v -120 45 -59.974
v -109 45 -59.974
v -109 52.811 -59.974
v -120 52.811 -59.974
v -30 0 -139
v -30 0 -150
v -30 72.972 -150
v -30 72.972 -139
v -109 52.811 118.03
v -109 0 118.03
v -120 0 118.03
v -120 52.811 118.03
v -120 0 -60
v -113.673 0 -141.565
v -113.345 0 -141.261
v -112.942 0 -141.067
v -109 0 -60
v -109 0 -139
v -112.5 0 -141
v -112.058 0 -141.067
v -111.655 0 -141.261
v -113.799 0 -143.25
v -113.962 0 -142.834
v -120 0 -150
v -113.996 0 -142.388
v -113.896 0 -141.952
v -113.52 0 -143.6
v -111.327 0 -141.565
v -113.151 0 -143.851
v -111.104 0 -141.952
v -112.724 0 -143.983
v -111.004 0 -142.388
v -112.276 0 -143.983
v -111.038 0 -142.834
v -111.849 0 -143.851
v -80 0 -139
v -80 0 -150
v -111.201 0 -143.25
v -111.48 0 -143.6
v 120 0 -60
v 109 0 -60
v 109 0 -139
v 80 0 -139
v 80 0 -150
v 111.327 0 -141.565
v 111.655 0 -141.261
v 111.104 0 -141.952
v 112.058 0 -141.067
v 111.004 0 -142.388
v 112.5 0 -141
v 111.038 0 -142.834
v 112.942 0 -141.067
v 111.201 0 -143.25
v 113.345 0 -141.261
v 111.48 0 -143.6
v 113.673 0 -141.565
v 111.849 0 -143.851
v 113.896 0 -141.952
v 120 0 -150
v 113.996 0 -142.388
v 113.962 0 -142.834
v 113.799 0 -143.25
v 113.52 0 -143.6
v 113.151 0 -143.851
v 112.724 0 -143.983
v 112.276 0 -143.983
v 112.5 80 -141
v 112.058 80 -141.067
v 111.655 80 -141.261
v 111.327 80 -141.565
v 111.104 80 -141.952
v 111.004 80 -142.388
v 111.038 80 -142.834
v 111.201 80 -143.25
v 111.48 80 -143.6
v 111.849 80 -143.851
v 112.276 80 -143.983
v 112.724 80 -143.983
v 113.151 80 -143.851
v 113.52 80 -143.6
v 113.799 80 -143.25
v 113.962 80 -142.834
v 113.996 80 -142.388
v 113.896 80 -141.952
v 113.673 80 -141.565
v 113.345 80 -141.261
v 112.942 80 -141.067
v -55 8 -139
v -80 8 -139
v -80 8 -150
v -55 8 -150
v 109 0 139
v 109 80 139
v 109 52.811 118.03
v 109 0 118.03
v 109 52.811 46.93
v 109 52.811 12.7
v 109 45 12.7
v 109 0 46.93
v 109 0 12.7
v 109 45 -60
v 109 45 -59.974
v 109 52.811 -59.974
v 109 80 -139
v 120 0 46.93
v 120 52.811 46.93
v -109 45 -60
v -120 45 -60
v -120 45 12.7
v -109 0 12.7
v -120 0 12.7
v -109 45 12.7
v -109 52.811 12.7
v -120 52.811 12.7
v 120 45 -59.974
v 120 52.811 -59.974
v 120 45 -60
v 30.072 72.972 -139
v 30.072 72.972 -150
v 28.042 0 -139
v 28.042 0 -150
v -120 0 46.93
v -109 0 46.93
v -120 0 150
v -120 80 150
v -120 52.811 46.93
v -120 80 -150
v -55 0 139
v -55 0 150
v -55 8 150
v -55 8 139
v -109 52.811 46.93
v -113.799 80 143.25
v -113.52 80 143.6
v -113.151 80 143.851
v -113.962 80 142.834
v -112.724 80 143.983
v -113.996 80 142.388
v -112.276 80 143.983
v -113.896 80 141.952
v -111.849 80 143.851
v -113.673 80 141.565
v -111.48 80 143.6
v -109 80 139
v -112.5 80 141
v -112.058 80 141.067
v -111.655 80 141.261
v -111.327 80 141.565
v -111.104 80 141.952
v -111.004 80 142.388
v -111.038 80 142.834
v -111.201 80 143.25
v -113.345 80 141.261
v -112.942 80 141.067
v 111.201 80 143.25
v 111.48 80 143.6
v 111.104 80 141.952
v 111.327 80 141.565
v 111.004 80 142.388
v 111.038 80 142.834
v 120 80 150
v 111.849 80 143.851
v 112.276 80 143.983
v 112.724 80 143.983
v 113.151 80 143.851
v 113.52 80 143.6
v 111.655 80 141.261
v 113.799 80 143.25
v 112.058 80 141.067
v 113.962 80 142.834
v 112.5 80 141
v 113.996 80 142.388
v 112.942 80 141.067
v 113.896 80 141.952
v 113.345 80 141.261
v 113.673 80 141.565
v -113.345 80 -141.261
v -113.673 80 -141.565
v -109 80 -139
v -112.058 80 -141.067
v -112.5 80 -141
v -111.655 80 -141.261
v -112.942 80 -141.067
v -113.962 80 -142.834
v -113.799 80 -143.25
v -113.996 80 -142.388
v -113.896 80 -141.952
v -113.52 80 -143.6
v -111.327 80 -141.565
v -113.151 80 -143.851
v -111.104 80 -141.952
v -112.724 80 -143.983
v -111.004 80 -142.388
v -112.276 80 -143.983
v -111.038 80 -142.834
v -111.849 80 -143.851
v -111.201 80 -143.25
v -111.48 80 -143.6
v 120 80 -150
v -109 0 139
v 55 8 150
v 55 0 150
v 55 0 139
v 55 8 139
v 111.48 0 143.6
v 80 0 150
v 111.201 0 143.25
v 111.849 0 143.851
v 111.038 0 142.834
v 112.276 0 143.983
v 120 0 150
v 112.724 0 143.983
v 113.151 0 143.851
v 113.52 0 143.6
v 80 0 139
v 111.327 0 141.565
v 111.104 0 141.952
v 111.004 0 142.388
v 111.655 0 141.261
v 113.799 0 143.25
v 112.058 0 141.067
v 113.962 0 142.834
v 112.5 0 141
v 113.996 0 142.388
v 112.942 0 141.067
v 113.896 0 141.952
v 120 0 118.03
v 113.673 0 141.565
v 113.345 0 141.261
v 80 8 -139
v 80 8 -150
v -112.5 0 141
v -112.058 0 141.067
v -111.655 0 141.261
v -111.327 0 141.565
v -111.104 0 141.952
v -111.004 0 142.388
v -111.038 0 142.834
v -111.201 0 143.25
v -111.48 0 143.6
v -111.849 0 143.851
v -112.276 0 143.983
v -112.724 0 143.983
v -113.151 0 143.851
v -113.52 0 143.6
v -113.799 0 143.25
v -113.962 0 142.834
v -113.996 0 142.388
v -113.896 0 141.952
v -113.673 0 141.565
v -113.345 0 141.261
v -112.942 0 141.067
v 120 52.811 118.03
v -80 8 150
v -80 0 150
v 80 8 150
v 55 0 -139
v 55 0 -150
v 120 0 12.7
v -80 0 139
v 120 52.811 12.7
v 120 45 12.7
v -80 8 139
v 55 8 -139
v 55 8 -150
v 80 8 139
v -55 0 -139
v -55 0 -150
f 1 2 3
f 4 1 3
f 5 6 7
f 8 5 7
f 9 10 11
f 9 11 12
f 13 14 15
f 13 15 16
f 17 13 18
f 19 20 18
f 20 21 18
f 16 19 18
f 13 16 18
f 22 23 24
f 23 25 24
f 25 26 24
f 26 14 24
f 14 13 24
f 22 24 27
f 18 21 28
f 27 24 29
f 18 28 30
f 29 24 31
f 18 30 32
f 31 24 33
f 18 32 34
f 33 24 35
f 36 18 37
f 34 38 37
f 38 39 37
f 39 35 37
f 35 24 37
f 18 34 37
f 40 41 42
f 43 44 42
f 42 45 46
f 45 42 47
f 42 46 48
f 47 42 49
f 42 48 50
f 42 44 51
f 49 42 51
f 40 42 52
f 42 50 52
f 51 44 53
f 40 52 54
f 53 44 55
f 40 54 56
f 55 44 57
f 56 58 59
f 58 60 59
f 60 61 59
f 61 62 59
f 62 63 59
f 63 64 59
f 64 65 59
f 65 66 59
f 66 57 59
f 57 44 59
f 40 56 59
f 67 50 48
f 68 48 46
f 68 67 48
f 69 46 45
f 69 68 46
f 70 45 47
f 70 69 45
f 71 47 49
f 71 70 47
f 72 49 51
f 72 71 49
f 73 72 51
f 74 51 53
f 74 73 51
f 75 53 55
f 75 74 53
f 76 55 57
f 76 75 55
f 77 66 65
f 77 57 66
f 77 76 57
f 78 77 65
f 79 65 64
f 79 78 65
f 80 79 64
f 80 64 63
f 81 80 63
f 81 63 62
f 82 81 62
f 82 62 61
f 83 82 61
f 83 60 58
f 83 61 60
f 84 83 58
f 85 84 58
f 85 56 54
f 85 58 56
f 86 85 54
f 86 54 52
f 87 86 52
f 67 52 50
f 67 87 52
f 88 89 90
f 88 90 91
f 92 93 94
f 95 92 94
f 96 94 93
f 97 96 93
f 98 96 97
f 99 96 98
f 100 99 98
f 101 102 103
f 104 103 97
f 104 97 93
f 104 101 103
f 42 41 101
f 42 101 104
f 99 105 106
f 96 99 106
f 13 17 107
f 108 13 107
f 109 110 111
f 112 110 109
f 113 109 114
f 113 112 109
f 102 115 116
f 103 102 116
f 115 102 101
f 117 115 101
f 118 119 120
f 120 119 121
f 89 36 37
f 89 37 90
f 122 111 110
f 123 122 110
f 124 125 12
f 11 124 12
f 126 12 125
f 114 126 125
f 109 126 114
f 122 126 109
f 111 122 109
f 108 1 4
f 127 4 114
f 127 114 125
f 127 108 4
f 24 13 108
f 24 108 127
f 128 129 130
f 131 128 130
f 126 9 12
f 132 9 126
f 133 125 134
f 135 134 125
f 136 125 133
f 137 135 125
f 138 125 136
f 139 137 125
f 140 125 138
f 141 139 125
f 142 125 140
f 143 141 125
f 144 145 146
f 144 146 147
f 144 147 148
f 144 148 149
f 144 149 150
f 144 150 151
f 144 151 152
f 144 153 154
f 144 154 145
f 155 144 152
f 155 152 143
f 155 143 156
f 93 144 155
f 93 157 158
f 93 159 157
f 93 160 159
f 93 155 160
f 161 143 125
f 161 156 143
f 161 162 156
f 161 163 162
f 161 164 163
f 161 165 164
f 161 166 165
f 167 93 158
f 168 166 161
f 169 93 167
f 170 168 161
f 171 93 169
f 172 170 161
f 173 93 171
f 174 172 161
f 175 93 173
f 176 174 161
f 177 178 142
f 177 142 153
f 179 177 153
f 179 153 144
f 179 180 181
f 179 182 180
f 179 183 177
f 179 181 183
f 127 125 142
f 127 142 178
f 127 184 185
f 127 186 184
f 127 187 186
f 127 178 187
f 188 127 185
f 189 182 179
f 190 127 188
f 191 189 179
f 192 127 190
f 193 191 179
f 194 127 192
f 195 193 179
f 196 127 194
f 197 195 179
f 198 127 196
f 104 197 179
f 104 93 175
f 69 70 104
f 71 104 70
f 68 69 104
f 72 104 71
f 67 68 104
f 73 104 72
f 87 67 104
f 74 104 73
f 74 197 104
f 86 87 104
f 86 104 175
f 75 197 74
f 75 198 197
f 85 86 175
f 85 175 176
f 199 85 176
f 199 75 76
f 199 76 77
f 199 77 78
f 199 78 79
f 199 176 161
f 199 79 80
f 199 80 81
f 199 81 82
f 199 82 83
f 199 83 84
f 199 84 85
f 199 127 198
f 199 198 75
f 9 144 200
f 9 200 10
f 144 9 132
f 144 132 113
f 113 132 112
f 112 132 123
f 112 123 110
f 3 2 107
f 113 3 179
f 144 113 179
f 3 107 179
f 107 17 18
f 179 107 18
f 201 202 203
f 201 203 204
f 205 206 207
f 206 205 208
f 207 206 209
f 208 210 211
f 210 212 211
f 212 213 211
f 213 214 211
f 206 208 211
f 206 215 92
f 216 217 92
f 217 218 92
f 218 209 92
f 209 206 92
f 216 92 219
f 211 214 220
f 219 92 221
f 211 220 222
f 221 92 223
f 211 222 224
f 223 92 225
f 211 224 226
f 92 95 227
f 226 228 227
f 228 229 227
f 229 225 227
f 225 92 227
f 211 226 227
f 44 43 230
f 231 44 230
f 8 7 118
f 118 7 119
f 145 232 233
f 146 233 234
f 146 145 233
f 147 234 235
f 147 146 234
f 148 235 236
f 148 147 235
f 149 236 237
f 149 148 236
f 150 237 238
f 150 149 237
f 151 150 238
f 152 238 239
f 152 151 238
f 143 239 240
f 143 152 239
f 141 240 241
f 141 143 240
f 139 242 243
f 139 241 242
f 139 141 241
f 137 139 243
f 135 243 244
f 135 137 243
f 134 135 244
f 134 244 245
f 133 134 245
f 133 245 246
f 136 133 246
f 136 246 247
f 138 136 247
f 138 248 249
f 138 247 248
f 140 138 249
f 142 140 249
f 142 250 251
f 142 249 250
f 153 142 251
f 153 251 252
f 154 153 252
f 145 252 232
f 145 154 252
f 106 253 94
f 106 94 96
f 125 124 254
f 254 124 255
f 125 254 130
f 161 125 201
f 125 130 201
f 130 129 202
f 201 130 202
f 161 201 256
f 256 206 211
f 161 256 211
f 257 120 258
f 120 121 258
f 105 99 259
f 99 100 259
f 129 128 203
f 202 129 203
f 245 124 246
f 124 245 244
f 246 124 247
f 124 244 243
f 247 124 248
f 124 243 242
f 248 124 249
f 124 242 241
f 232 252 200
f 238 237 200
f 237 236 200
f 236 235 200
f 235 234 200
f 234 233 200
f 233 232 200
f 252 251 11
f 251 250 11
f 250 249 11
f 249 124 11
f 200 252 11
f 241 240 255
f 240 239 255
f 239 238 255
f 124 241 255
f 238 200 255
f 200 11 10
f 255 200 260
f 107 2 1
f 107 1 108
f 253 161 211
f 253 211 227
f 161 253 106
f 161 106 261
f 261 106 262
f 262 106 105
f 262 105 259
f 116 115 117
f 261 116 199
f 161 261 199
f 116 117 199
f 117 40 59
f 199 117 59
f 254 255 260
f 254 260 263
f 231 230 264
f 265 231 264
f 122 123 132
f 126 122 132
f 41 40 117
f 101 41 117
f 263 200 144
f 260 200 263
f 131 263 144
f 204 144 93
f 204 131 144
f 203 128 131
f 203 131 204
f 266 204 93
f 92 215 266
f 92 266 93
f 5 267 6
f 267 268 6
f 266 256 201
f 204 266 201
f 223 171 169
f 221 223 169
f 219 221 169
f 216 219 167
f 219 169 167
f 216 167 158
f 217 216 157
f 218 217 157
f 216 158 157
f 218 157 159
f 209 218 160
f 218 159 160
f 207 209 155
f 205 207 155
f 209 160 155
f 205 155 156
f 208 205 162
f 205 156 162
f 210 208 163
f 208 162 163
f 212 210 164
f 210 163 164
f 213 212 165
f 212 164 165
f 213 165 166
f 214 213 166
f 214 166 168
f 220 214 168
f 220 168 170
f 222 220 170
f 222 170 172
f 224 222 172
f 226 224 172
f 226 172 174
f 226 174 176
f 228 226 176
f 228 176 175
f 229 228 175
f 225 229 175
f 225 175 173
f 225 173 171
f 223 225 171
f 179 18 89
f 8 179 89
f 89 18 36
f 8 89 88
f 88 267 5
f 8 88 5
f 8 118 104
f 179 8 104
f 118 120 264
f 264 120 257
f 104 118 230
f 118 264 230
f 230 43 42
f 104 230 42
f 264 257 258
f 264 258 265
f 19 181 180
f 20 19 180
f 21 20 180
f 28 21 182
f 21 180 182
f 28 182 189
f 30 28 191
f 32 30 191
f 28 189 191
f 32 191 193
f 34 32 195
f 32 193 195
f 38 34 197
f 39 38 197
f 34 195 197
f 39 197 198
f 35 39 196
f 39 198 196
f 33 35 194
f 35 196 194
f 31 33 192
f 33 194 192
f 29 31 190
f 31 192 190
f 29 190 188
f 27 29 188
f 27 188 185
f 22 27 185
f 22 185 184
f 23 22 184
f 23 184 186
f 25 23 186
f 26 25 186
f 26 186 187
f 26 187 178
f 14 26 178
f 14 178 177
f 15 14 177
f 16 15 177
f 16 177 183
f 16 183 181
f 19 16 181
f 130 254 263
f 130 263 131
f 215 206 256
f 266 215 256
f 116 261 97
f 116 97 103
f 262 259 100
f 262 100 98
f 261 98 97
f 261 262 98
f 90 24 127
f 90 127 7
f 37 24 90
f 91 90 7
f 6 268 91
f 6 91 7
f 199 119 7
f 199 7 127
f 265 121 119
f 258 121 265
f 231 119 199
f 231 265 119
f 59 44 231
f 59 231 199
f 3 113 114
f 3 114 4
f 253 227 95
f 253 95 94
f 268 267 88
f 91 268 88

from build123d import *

# Parameters (mm, degrees)
SKETCH1_W               = 240
SKETCH1_H               = 300
BOSS_EXTRUDE1_DEPTH     = 80
SHELL1_T                = -11
SKETCH4_R               = 1.5
CUT_EXTRUDE2_DEPTH      = 209.086520467
MIRROR2_COPY_1_SKETCH_R = 1.5
MIRROR2_COPY_1_DEPTH    = 209.086520467
SKETCH16_W              = 25
SKETCH16_H              = 8
CUT_EXTRUDE9_DEPTH      = 333.866339542
SKETCH18_W              = 71.1
SKETCH18_H              = 45
SKETCH18_W_2            = 72.7
CUT_EXTRUDE10_DEPTH     = 295.108823397
SKETCH19_W              = 71.1
SKETCH19_H              = 7.810897368
SKETCH19_W_2            = 72.674166019
CUT_EXTRUDE11_DEPTH     = 295.108823397
CUT_EXTRUDE12_DEPTH     = 15


with BuildPart() as part:
    # Sketch1 → Boss-Extrude1 (new body)
    with BuildSketch(Plane(origin=(0, 0, 0), x_dir=(1, 0, 0), z_dir=(0, 1, 0))):
        Rectangle(SKETCH1_W, SKETCH1_H)
    extrude(amount=BOSS_EXTRUDE1_DEPTH)

    # Shell1
    shell1_openings = [part.faces().sort_by_distance(p)[0] for p in [
        (0, 80, 0),
        (0, 0, 0),
    ]]
    offset(amount=SHELL1_T, openings=shell1_openings, kind=Kind.INTERSECTION)

    # Sketch4 → Cut-Extrude2 (cut, through all)
    with BuildSketch(Plane(origin=(0, 80, 0), x_dir=(1, 0, 0), z_dir=(0, 1, 0))):
        with Locations(Location((-112.5, 142.5, 0), (0, 0, 270))):
            Circle(SKETCH4_R)
    cut_extrude2 = extrude(amount=-CUT_EXTRUDE2_DEPTH, mode=Mode.SUBTRACT)

    # Mirror1: Cut-Extrude2 across plane
    add(cut_extrude2.mirror(Plane(origin=(0, 0, 0), x_dir=(0, 0, 1), z_dir=(1, 0, 0))), mode=Mode.SUBTRACT)

    # Mirror2: Cut-Extrude2 across plane
    add(cut_extrude2.mirror(Plane.XY), mode=Mode.SUBTRACT)

    # Mirror2 copy 1 sketch → Mirror2 copy 1 (cut, through all)
    with BuildSketch(Plane(origin=(0, 80, 0), x_dir=(-1, 0, 0), z_dir=(0, 1, 0))):
        with Locations(Location((-112.5, 142.5, 0), (0, 0, 270))):
            Circle(MIRROR2_COPY_1_SKETCH_R)
    extrude(amount=-MIRROR2_COPY_1_DEPTH, mode=Mode.SUBTRACT)

    # Sketch16 → Cut-Extrude9 (cut, through all)
    with BuildSketch(Plane.XY.offset(150)):
        with Locations((-67.5, 4)):
            Rectangle(SKETCH16_W, SKETCH16_H)
    cut_extrude9 = extrude(amount=-CUT_EXTRUDE9_DEPTH, mode=Mode.SUBTRACT)

    # Mirror3: Cut-Extrude9 across plane
    add(cut_extrude9.mirror(Plane(origin=(0, 0, 0), x_dir=(0, 0, 1), z_dir=(1, 0, 0))), mode=Mode.SUBTRACT)

    # Sketch18 → Cut-Extrude10 (cut, through all)
    with BuildSketch(Plane(origin=(120, 0, 0), x_dir=(0, 0, -1), z_dir=(1, 0, 0))):
        with Locations((-82.48, 22.5)):
            Rectangle(SKETCH18_W, SKETCH18_H)
        with Locations((23.65, 22.5)):
            Rectangle(SKETCH18_W_2, SKETCH18_H)
    extrude(amount=-CUT_EXTRUDE10_DEPTH, mode=Mode.SUBTRACT)

    # Sketch19 → Cut-Extrude11 (cut, through all)
    with BuildSketch(Plane(origin=(120, 0, 0), x_dir=(0, 0, -1), z_dir=(1, 0, 0))):
        with Locations((-82.48, 48.905448684)):
            Rectangle(SKETCH19_W, SKETCH19_H)
        with Locations((23.637083009, 48.905448684)):
            Rectangle(SKETCH19_W_2, SKETCH19_H)
    extrude(amount=-CUT_EXTRUDE11_DEPTH, mode=Mode.SUBTRACT)

    # Sketch22 → Cut-Extrude12 (cut)
    with BuildSketch(Plane(origin=(0, 0, -150), x_dir=(-1, 0, 0), z_dir=(0, 0, -1))):
        Polygon((-28.041535061, 0), (30, 0), (30, 72.971763315), (-30.071746562, 72.971763315), align=None)
    extrude(amount=-CUT_EXTRUDE12_DEPTH, mode=Mode.SUBTRACT)


solid = part.part
